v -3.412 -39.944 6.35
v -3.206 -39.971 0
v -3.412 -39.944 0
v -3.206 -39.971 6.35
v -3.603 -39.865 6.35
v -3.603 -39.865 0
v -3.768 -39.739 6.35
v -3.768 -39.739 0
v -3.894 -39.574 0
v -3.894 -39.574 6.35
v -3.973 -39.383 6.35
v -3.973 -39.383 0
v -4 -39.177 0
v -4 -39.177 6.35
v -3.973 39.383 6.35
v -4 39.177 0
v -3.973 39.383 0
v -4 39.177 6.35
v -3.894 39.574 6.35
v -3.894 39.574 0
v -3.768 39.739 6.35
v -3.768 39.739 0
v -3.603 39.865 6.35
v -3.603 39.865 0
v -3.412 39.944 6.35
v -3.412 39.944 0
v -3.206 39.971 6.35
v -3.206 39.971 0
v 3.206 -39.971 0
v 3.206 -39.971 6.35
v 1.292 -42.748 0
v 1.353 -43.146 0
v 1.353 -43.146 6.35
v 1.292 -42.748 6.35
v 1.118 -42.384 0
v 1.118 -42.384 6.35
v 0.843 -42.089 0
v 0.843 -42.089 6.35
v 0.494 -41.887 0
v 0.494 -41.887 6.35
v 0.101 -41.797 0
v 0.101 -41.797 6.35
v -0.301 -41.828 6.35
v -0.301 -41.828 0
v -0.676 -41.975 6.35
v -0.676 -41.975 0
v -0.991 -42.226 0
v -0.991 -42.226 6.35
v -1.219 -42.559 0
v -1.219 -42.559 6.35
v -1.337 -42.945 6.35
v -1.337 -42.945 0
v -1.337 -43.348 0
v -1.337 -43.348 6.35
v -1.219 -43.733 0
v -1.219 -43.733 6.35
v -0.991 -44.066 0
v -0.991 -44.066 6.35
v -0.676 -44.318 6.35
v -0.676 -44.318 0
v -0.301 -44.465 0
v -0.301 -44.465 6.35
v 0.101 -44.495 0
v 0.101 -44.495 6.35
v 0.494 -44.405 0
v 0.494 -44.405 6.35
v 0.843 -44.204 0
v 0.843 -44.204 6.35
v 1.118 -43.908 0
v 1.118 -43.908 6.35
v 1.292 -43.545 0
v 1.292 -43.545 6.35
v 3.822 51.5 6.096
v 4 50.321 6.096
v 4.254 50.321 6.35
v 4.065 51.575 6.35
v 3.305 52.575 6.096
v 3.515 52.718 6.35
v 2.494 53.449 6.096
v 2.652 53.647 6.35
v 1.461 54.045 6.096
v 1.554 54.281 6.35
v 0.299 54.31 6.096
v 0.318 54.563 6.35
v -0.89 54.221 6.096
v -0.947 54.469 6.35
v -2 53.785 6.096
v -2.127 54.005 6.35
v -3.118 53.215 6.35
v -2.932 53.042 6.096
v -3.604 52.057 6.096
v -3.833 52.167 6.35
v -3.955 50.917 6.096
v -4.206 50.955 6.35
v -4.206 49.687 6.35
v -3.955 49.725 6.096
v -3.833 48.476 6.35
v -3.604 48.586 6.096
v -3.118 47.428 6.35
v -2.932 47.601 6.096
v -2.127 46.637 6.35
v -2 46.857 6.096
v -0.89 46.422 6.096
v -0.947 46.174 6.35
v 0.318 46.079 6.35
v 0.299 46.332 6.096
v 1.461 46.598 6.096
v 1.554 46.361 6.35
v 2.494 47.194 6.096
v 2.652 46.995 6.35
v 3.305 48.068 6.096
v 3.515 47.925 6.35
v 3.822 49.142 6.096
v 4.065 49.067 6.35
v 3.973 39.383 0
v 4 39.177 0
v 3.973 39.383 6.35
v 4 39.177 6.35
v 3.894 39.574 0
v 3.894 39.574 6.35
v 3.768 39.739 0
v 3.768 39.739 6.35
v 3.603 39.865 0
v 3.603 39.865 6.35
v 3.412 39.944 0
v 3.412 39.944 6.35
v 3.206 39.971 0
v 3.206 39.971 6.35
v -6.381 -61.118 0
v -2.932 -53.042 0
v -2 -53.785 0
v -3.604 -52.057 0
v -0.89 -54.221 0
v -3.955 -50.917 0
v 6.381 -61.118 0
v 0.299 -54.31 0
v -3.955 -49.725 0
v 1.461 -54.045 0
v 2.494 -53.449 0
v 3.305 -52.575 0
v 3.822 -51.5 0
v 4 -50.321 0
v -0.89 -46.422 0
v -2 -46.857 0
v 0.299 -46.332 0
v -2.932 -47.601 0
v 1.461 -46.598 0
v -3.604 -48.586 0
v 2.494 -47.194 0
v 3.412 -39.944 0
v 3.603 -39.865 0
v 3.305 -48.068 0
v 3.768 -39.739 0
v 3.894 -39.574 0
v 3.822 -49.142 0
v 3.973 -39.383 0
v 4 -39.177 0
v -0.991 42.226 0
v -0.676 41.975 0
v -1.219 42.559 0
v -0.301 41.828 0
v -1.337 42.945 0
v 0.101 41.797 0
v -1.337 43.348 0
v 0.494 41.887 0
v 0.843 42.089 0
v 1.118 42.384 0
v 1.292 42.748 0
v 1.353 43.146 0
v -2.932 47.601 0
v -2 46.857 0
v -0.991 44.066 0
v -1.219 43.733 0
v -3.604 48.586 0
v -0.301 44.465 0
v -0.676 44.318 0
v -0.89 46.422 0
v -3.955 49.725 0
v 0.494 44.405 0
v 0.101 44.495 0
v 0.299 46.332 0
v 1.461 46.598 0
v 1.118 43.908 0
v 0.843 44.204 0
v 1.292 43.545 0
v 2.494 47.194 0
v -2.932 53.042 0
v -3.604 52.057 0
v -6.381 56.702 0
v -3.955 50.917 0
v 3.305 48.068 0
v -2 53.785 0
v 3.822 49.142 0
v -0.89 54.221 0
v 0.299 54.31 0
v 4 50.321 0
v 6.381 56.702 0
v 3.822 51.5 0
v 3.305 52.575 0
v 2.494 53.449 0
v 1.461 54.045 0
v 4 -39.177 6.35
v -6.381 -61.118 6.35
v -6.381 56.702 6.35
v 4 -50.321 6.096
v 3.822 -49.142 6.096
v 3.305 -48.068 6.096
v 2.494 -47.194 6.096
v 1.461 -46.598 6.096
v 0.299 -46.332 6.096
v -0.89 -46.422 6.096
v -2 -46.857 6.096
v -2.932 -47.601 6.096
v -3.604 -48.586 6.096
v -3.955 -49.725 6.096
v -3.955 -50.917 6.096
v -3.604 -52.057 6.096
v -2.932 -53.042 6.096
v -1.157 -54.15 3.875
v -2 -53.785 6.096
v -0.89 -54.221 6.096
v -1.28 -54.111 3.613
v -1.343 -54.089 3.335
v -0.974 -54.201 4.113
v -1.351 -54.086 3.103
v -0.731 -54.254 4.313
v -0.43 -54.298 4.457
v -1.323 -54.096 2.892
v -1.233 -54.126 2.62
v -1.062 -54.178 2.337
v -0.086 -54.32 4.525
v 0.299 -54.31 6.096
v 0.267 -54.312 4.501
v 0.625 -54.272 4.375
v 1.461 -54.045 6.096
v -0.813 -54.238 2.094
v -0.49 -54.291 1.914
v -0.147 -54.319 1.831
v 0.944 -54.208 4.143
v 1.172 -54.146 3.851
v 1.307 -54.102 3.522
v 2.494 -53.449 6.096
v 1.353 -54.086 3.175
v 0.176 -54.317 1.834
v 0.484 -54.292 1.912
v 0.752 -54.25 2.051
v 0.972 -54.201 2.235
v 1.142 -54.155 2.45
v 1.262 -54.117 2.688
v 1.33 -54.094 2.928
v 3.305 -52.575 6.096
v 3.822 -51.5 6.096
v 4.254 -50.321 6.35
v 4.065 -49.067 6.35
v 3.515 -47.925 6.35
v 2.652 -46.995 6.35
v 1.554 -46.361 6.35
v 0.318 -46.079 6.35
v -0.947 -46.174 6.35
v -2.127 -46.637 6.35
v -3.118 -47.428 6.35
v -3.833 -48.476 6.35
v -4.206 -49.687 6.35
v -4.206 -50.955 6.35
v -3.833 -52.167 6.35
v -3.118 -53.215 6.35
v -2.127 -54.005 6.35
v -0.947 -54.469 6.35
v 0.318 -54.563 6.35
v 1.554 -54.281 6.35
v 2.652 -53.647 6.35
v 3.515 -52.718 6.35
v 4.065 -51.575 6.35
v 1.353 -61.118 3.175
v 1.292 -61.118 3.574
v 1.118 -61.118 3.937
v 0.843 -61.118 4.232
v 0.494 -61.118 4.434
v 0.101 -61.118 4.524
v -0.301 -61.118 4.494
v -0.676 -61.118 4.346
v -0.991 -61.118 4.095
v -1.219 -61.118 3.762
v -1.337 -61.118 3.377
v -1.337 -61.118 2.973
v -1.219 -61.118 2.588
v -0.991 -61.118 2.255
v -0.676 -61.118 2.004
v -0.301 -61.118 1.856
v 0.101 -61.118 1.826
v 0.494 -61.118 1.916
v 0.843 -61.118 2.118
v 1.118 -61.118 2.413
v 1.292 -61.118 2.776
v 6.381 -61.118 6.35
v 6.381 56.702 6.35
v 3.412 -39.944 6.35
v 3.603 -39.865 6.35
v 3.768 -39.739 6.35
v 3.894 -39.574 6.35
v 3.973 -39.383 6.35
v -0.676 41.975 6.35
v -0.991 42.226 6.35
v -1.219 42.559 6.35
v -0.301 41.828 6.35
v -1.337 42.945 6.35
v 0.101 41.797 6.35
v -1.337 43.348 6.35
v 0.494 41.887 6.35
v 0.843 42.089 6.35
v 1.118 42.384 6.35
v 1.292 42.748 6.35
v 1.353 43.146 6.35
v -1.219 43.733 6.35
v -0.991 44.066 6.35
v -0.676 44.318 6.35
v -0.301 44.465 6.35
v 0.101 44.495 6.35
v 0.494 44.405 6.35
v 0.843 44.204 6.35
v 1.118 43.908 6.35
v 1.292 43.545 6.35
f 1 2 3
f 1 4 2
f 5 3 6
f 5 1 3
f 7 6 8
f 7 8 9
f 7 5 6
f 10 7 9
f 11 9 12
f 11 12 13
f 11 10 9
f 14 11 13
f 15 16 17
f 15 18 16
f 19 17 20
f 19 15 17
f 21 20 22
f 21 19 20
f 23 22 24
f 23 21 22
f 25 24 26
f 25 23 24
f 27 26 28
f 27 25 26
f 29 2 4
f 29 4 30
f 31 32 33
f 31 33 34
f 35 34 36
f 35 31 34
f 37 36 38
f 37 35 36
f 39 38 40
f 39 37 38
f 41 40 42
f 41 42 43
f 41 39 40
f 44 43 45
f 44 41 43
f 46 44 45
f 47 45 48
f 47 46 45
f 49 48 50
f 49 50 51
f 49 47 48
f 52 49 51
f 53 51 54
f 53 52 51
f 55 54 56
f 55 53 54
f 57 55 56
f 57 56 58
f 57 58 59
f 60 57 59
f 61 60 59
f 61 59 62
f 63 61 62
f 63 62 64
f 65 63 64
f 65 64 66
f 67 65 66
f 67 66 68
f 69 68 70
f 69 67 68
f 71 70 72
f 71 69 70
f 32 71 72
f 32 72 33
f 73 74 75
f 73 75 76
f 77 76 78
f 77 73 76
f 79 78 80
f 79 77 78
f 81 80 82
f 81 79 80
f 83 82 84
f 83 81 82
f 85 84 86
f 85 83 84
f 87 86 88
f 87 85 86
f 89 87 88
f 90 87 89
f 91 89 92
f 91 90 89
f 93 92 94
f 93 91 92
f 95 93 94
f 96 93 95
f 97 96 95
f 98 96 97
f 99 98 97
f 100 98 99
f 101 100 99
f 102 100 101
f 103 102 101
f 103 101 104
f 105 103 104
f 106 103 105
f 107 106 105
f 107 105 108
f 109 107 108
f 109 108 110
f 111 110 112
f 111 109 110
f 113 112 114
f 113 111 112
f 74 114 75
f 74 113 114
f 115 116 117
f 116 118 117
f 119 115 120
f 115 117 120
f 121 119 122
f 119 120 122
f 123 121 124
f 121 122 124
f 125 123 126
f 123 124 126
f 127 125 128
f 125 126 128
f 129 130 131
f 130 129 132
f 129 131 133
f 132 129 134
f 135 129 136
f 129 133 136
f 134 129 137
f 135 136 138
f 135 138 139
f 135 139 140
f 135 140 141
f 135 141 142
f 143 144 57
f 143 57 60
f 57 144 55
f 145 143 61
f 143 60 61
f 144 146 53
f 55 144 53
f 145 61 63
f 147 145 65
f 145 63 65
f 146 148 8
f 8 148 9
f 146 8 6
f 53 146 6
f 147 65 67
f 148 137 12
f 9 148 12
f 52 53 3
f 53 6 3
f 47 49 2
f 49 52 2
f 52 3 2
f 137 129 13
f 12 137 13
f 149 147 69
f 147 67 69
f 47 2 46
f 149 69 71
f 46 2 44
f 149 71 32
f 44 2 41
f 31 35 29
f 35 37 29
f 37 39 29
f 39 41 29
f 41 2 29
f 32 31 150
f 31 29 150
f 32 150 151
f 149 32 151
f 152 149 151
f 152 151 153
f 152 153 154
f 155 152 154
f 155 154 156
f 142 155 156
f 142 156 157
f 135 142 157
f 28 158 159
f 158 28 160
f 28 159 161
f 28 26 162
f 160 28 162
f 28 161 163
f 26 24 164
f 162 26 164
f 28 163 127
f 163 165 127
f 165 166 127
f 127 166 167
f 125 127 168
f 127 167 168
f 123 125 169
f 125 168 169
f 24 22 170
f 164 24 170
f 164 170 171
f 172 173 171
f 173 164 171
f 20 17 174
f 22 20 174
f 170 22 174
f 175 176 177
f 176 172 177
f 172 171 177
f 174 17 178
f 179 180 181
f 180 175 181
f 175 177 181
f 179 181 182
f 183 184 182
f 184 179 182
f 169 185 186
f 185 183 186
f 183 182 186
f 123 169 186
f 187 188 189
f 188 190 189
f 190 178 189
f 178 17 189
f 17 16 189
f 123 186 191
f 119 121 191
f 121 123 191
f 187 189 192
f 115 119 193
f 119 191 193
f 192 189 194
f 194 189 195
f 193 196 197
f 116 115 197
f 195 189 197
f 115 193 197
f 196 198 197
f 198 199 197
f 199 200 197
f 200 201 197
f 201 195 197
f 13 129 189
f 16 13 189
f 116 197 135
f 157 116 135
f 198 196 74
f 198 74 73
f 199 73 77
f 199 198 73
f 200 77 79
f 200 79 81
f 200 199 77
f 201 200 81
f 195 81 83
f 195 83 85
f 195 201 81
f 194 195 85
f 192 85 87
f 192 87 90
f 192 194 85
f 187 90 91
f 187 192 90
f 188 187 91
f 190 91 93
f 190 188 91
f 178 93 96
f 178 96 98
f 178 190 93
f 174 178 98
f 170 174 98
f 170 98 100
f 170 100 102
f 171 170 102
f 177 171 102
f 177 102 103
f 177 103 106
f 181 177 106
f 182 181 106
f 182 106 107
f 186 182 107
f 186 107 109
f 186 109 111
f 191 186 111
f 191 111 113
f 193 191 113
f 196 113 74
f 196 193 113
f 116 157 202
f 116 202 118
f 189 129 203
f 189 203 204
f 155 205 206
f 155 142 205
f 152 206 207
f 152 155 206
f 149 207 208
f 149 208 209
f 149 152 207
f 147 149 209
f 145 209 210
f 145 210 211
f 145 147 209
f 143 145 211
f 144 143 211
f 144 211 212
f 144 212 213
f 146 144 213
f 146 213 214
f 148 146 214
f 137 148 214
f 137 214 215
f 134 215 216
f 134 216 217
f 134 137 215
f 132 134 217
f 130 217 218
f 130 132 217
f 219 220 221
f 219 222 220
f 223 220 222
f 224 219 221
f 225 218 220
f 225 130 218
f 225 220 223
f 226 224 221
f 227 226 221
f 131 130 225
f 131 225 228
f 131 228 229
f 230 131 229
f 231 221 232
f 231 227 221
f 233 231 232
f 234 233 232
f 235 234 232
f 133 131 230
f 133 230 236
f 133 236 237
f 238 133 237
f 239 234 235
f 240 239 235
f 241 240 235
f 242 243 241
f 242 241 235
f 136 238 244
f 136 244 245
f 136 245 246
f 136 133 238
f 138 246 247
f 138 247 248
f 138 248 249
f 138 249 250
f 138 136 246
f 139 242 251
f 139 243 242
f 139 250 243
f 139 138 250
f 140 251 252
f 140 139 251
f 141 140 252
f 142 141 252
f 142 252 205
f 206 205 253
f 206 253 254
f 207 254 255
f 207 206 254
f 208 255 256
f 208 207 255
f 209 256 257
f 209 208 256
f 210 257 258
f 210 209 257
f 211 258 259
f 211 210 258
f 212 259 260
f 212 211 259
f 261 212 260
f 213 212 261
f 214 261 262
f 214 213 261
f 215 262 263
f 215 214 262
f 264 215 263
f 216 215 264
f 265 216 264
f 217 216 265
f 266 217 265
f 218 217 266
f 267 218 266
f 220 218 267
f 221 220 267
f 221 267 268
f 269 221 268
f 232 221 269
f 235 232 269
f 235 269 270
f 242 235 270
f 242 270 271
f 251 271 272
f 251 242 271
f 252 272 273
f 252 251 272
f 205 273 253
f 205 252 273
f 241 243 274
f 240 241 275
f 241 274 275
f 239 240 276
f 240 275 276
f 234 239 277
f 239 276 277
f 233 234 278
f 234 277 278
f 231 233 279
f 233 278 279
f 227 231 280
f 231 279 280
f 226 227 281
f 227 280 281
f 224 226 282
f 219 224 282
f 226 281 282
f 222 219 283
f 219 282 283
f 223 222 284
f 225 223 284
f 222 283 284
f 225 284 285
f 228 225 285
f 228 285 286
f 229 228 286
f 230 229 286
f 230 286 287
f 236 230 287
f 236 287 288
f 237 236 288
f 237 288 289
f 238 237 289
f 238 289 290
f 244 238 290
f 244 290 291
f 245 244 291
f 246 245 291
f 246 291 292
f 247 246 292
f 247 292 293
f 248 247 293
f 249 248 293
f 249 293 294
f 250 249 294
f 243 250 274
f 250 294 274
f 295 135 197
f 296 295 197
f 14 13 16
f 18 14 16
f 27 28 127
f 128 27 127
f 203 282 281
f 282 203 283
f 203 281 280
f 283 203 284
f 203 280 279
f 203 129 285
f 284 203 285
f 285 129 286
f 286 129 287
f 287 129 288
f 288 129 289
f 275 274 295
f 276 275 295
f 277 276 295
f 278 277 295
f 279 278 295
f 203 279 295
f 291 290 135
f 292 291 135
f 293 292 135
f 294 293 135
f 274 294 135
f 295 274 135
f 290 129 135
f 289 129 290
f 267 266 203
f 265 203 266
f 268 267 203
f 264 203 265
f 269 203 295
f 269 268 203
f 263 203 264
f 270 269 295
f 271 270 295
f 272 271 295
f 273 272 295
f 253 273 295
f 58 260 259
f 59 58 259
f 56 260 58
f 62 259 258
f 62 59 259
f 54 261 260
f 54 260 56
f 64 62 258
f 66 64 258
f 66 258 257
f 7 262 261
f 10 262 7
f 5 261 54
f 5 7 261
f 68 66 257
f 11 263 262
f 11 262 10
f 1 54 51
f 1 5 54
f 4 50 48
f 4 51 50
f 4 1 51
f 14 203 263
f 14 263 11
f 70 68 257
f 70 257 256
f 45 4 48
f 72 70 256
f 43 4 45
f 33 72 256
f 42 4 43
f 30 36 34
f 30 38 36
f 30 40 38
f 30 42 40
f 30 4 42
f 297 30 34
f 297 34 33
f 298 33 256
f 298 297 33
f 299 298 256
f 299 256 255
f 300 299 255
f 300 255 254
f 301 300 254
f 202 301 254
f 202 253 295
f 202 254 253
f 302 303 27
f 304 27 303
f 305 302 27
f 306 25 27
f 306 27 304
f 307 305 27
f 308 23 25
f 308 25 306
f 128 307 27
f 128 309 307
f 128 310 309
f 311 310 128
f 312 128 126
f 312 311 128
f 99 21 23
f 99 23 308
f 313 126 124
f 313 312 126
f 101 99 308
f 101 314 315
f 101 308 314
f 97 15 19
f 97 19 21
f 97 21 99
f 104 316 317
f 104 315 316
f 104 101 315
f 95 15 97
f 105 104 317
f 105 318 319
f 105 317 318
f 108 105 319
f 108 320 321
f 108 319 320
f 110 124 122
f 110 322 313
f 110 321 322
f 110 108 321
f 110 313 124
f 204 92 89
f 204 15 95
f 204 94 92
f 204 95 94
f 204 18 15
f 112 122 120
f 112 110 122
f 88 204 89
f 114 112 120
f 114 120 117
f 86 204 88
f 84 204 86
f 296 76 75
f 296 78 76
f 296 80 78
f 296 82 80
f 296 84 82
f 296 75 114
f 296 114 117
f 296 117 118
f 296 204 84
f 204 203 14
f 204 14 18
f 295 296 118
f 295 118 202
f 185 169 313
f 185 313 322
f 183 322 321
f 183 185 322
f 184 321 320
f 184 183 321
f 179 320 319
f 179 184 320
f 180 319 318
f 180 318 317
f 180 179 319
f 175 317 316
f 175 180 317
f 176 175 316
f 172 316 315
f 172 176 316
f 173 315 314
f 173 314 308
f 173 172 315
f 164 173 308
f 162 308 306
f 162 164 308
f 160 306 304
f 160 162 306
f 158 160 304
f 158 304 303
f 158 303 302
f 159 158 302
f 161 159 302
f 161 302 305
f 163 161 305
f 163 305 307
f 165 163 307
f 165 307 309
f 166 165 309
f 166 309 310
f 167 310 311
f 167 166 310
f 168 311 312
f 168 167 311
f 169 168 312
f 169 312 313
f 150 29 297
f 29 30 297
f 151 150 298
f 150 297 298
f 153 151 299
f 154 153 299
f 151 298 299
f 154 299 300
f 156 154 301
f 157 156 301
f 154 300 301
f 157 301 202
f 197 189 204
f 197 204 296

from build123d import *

# Parameters (mm, degrees)
F0_W     = 12.7625
F0_H     = 117.8206766
F0_R     = 4
F0_R_2   = 1.35255
F0_W_2   = 8
F0_H_2   = 79.9424962
F1_DEPTH = 6.35
F2_R     = 0.79375
F3_SIZE  = 0.254
F4_R     = 1.35255
F5_DEPTH = 8.0325436313


# Not quite as in the source:
# - a feature names something its author has since deleted; it is built from what else it names


with BuildPart() as f1:
    # F0 (on Top) → F1 (new body)
    with BuildSketch(Plane.XY):
        with Locations((0, -2.2078402)):
            Rectangle(F0_W, F0_H)
        with Locations((0, -50.3212481)):
            Circle(F0_R, mode=Mode.SUBTRACT)
        with Locations((0, -43.1462481)):
            Circle(F0_R_2, mode=Mode.SUBTRACT)
        Rectangle(F0_W_2, F0_H_2, mode=Mode.SUBTRACT)
        with Locations((0, 43.1462481)):
            Circle(F0_R_2, mode=Mode.SUBTRACT)
        with Locations((0, 50.3212481)):
            Circle(F0_R, mode=Mode.SUBTRACT)
    extrude(amount=F1_DEPTH)

    # F2
    f2_edges = [f1.edges().sort_by_distance(p)[0] for p in [
        (4, -39.971248, 3.175),
        (-4, -39.971248, 3.175),
        (-4, 39.971248, 3.175),
        (4, 39.971248, 3.175),
    ]]
    fillet(f2_edges, radius=F2_R)

    # F3
    f3_edges = [f1.edges().sort_by_distance(p)[0] for p in [
        (-4, 50.321248, 6.35),
        (-4, -50.321248, 6.35),
    ]]
    chamfer(f3_edges, length=F3_SIZE)

    # F4 (on face) → F5 (cut, up to face)
    with BuildSketch(Plane.XZ.offset(61.1181785)):
        with Locations((0, 3.175)):
            Circle(F4_R)
    extrude(amount=-F5_DEPTH, mode=Mode.SUBTRACT)


solid = f1.part
